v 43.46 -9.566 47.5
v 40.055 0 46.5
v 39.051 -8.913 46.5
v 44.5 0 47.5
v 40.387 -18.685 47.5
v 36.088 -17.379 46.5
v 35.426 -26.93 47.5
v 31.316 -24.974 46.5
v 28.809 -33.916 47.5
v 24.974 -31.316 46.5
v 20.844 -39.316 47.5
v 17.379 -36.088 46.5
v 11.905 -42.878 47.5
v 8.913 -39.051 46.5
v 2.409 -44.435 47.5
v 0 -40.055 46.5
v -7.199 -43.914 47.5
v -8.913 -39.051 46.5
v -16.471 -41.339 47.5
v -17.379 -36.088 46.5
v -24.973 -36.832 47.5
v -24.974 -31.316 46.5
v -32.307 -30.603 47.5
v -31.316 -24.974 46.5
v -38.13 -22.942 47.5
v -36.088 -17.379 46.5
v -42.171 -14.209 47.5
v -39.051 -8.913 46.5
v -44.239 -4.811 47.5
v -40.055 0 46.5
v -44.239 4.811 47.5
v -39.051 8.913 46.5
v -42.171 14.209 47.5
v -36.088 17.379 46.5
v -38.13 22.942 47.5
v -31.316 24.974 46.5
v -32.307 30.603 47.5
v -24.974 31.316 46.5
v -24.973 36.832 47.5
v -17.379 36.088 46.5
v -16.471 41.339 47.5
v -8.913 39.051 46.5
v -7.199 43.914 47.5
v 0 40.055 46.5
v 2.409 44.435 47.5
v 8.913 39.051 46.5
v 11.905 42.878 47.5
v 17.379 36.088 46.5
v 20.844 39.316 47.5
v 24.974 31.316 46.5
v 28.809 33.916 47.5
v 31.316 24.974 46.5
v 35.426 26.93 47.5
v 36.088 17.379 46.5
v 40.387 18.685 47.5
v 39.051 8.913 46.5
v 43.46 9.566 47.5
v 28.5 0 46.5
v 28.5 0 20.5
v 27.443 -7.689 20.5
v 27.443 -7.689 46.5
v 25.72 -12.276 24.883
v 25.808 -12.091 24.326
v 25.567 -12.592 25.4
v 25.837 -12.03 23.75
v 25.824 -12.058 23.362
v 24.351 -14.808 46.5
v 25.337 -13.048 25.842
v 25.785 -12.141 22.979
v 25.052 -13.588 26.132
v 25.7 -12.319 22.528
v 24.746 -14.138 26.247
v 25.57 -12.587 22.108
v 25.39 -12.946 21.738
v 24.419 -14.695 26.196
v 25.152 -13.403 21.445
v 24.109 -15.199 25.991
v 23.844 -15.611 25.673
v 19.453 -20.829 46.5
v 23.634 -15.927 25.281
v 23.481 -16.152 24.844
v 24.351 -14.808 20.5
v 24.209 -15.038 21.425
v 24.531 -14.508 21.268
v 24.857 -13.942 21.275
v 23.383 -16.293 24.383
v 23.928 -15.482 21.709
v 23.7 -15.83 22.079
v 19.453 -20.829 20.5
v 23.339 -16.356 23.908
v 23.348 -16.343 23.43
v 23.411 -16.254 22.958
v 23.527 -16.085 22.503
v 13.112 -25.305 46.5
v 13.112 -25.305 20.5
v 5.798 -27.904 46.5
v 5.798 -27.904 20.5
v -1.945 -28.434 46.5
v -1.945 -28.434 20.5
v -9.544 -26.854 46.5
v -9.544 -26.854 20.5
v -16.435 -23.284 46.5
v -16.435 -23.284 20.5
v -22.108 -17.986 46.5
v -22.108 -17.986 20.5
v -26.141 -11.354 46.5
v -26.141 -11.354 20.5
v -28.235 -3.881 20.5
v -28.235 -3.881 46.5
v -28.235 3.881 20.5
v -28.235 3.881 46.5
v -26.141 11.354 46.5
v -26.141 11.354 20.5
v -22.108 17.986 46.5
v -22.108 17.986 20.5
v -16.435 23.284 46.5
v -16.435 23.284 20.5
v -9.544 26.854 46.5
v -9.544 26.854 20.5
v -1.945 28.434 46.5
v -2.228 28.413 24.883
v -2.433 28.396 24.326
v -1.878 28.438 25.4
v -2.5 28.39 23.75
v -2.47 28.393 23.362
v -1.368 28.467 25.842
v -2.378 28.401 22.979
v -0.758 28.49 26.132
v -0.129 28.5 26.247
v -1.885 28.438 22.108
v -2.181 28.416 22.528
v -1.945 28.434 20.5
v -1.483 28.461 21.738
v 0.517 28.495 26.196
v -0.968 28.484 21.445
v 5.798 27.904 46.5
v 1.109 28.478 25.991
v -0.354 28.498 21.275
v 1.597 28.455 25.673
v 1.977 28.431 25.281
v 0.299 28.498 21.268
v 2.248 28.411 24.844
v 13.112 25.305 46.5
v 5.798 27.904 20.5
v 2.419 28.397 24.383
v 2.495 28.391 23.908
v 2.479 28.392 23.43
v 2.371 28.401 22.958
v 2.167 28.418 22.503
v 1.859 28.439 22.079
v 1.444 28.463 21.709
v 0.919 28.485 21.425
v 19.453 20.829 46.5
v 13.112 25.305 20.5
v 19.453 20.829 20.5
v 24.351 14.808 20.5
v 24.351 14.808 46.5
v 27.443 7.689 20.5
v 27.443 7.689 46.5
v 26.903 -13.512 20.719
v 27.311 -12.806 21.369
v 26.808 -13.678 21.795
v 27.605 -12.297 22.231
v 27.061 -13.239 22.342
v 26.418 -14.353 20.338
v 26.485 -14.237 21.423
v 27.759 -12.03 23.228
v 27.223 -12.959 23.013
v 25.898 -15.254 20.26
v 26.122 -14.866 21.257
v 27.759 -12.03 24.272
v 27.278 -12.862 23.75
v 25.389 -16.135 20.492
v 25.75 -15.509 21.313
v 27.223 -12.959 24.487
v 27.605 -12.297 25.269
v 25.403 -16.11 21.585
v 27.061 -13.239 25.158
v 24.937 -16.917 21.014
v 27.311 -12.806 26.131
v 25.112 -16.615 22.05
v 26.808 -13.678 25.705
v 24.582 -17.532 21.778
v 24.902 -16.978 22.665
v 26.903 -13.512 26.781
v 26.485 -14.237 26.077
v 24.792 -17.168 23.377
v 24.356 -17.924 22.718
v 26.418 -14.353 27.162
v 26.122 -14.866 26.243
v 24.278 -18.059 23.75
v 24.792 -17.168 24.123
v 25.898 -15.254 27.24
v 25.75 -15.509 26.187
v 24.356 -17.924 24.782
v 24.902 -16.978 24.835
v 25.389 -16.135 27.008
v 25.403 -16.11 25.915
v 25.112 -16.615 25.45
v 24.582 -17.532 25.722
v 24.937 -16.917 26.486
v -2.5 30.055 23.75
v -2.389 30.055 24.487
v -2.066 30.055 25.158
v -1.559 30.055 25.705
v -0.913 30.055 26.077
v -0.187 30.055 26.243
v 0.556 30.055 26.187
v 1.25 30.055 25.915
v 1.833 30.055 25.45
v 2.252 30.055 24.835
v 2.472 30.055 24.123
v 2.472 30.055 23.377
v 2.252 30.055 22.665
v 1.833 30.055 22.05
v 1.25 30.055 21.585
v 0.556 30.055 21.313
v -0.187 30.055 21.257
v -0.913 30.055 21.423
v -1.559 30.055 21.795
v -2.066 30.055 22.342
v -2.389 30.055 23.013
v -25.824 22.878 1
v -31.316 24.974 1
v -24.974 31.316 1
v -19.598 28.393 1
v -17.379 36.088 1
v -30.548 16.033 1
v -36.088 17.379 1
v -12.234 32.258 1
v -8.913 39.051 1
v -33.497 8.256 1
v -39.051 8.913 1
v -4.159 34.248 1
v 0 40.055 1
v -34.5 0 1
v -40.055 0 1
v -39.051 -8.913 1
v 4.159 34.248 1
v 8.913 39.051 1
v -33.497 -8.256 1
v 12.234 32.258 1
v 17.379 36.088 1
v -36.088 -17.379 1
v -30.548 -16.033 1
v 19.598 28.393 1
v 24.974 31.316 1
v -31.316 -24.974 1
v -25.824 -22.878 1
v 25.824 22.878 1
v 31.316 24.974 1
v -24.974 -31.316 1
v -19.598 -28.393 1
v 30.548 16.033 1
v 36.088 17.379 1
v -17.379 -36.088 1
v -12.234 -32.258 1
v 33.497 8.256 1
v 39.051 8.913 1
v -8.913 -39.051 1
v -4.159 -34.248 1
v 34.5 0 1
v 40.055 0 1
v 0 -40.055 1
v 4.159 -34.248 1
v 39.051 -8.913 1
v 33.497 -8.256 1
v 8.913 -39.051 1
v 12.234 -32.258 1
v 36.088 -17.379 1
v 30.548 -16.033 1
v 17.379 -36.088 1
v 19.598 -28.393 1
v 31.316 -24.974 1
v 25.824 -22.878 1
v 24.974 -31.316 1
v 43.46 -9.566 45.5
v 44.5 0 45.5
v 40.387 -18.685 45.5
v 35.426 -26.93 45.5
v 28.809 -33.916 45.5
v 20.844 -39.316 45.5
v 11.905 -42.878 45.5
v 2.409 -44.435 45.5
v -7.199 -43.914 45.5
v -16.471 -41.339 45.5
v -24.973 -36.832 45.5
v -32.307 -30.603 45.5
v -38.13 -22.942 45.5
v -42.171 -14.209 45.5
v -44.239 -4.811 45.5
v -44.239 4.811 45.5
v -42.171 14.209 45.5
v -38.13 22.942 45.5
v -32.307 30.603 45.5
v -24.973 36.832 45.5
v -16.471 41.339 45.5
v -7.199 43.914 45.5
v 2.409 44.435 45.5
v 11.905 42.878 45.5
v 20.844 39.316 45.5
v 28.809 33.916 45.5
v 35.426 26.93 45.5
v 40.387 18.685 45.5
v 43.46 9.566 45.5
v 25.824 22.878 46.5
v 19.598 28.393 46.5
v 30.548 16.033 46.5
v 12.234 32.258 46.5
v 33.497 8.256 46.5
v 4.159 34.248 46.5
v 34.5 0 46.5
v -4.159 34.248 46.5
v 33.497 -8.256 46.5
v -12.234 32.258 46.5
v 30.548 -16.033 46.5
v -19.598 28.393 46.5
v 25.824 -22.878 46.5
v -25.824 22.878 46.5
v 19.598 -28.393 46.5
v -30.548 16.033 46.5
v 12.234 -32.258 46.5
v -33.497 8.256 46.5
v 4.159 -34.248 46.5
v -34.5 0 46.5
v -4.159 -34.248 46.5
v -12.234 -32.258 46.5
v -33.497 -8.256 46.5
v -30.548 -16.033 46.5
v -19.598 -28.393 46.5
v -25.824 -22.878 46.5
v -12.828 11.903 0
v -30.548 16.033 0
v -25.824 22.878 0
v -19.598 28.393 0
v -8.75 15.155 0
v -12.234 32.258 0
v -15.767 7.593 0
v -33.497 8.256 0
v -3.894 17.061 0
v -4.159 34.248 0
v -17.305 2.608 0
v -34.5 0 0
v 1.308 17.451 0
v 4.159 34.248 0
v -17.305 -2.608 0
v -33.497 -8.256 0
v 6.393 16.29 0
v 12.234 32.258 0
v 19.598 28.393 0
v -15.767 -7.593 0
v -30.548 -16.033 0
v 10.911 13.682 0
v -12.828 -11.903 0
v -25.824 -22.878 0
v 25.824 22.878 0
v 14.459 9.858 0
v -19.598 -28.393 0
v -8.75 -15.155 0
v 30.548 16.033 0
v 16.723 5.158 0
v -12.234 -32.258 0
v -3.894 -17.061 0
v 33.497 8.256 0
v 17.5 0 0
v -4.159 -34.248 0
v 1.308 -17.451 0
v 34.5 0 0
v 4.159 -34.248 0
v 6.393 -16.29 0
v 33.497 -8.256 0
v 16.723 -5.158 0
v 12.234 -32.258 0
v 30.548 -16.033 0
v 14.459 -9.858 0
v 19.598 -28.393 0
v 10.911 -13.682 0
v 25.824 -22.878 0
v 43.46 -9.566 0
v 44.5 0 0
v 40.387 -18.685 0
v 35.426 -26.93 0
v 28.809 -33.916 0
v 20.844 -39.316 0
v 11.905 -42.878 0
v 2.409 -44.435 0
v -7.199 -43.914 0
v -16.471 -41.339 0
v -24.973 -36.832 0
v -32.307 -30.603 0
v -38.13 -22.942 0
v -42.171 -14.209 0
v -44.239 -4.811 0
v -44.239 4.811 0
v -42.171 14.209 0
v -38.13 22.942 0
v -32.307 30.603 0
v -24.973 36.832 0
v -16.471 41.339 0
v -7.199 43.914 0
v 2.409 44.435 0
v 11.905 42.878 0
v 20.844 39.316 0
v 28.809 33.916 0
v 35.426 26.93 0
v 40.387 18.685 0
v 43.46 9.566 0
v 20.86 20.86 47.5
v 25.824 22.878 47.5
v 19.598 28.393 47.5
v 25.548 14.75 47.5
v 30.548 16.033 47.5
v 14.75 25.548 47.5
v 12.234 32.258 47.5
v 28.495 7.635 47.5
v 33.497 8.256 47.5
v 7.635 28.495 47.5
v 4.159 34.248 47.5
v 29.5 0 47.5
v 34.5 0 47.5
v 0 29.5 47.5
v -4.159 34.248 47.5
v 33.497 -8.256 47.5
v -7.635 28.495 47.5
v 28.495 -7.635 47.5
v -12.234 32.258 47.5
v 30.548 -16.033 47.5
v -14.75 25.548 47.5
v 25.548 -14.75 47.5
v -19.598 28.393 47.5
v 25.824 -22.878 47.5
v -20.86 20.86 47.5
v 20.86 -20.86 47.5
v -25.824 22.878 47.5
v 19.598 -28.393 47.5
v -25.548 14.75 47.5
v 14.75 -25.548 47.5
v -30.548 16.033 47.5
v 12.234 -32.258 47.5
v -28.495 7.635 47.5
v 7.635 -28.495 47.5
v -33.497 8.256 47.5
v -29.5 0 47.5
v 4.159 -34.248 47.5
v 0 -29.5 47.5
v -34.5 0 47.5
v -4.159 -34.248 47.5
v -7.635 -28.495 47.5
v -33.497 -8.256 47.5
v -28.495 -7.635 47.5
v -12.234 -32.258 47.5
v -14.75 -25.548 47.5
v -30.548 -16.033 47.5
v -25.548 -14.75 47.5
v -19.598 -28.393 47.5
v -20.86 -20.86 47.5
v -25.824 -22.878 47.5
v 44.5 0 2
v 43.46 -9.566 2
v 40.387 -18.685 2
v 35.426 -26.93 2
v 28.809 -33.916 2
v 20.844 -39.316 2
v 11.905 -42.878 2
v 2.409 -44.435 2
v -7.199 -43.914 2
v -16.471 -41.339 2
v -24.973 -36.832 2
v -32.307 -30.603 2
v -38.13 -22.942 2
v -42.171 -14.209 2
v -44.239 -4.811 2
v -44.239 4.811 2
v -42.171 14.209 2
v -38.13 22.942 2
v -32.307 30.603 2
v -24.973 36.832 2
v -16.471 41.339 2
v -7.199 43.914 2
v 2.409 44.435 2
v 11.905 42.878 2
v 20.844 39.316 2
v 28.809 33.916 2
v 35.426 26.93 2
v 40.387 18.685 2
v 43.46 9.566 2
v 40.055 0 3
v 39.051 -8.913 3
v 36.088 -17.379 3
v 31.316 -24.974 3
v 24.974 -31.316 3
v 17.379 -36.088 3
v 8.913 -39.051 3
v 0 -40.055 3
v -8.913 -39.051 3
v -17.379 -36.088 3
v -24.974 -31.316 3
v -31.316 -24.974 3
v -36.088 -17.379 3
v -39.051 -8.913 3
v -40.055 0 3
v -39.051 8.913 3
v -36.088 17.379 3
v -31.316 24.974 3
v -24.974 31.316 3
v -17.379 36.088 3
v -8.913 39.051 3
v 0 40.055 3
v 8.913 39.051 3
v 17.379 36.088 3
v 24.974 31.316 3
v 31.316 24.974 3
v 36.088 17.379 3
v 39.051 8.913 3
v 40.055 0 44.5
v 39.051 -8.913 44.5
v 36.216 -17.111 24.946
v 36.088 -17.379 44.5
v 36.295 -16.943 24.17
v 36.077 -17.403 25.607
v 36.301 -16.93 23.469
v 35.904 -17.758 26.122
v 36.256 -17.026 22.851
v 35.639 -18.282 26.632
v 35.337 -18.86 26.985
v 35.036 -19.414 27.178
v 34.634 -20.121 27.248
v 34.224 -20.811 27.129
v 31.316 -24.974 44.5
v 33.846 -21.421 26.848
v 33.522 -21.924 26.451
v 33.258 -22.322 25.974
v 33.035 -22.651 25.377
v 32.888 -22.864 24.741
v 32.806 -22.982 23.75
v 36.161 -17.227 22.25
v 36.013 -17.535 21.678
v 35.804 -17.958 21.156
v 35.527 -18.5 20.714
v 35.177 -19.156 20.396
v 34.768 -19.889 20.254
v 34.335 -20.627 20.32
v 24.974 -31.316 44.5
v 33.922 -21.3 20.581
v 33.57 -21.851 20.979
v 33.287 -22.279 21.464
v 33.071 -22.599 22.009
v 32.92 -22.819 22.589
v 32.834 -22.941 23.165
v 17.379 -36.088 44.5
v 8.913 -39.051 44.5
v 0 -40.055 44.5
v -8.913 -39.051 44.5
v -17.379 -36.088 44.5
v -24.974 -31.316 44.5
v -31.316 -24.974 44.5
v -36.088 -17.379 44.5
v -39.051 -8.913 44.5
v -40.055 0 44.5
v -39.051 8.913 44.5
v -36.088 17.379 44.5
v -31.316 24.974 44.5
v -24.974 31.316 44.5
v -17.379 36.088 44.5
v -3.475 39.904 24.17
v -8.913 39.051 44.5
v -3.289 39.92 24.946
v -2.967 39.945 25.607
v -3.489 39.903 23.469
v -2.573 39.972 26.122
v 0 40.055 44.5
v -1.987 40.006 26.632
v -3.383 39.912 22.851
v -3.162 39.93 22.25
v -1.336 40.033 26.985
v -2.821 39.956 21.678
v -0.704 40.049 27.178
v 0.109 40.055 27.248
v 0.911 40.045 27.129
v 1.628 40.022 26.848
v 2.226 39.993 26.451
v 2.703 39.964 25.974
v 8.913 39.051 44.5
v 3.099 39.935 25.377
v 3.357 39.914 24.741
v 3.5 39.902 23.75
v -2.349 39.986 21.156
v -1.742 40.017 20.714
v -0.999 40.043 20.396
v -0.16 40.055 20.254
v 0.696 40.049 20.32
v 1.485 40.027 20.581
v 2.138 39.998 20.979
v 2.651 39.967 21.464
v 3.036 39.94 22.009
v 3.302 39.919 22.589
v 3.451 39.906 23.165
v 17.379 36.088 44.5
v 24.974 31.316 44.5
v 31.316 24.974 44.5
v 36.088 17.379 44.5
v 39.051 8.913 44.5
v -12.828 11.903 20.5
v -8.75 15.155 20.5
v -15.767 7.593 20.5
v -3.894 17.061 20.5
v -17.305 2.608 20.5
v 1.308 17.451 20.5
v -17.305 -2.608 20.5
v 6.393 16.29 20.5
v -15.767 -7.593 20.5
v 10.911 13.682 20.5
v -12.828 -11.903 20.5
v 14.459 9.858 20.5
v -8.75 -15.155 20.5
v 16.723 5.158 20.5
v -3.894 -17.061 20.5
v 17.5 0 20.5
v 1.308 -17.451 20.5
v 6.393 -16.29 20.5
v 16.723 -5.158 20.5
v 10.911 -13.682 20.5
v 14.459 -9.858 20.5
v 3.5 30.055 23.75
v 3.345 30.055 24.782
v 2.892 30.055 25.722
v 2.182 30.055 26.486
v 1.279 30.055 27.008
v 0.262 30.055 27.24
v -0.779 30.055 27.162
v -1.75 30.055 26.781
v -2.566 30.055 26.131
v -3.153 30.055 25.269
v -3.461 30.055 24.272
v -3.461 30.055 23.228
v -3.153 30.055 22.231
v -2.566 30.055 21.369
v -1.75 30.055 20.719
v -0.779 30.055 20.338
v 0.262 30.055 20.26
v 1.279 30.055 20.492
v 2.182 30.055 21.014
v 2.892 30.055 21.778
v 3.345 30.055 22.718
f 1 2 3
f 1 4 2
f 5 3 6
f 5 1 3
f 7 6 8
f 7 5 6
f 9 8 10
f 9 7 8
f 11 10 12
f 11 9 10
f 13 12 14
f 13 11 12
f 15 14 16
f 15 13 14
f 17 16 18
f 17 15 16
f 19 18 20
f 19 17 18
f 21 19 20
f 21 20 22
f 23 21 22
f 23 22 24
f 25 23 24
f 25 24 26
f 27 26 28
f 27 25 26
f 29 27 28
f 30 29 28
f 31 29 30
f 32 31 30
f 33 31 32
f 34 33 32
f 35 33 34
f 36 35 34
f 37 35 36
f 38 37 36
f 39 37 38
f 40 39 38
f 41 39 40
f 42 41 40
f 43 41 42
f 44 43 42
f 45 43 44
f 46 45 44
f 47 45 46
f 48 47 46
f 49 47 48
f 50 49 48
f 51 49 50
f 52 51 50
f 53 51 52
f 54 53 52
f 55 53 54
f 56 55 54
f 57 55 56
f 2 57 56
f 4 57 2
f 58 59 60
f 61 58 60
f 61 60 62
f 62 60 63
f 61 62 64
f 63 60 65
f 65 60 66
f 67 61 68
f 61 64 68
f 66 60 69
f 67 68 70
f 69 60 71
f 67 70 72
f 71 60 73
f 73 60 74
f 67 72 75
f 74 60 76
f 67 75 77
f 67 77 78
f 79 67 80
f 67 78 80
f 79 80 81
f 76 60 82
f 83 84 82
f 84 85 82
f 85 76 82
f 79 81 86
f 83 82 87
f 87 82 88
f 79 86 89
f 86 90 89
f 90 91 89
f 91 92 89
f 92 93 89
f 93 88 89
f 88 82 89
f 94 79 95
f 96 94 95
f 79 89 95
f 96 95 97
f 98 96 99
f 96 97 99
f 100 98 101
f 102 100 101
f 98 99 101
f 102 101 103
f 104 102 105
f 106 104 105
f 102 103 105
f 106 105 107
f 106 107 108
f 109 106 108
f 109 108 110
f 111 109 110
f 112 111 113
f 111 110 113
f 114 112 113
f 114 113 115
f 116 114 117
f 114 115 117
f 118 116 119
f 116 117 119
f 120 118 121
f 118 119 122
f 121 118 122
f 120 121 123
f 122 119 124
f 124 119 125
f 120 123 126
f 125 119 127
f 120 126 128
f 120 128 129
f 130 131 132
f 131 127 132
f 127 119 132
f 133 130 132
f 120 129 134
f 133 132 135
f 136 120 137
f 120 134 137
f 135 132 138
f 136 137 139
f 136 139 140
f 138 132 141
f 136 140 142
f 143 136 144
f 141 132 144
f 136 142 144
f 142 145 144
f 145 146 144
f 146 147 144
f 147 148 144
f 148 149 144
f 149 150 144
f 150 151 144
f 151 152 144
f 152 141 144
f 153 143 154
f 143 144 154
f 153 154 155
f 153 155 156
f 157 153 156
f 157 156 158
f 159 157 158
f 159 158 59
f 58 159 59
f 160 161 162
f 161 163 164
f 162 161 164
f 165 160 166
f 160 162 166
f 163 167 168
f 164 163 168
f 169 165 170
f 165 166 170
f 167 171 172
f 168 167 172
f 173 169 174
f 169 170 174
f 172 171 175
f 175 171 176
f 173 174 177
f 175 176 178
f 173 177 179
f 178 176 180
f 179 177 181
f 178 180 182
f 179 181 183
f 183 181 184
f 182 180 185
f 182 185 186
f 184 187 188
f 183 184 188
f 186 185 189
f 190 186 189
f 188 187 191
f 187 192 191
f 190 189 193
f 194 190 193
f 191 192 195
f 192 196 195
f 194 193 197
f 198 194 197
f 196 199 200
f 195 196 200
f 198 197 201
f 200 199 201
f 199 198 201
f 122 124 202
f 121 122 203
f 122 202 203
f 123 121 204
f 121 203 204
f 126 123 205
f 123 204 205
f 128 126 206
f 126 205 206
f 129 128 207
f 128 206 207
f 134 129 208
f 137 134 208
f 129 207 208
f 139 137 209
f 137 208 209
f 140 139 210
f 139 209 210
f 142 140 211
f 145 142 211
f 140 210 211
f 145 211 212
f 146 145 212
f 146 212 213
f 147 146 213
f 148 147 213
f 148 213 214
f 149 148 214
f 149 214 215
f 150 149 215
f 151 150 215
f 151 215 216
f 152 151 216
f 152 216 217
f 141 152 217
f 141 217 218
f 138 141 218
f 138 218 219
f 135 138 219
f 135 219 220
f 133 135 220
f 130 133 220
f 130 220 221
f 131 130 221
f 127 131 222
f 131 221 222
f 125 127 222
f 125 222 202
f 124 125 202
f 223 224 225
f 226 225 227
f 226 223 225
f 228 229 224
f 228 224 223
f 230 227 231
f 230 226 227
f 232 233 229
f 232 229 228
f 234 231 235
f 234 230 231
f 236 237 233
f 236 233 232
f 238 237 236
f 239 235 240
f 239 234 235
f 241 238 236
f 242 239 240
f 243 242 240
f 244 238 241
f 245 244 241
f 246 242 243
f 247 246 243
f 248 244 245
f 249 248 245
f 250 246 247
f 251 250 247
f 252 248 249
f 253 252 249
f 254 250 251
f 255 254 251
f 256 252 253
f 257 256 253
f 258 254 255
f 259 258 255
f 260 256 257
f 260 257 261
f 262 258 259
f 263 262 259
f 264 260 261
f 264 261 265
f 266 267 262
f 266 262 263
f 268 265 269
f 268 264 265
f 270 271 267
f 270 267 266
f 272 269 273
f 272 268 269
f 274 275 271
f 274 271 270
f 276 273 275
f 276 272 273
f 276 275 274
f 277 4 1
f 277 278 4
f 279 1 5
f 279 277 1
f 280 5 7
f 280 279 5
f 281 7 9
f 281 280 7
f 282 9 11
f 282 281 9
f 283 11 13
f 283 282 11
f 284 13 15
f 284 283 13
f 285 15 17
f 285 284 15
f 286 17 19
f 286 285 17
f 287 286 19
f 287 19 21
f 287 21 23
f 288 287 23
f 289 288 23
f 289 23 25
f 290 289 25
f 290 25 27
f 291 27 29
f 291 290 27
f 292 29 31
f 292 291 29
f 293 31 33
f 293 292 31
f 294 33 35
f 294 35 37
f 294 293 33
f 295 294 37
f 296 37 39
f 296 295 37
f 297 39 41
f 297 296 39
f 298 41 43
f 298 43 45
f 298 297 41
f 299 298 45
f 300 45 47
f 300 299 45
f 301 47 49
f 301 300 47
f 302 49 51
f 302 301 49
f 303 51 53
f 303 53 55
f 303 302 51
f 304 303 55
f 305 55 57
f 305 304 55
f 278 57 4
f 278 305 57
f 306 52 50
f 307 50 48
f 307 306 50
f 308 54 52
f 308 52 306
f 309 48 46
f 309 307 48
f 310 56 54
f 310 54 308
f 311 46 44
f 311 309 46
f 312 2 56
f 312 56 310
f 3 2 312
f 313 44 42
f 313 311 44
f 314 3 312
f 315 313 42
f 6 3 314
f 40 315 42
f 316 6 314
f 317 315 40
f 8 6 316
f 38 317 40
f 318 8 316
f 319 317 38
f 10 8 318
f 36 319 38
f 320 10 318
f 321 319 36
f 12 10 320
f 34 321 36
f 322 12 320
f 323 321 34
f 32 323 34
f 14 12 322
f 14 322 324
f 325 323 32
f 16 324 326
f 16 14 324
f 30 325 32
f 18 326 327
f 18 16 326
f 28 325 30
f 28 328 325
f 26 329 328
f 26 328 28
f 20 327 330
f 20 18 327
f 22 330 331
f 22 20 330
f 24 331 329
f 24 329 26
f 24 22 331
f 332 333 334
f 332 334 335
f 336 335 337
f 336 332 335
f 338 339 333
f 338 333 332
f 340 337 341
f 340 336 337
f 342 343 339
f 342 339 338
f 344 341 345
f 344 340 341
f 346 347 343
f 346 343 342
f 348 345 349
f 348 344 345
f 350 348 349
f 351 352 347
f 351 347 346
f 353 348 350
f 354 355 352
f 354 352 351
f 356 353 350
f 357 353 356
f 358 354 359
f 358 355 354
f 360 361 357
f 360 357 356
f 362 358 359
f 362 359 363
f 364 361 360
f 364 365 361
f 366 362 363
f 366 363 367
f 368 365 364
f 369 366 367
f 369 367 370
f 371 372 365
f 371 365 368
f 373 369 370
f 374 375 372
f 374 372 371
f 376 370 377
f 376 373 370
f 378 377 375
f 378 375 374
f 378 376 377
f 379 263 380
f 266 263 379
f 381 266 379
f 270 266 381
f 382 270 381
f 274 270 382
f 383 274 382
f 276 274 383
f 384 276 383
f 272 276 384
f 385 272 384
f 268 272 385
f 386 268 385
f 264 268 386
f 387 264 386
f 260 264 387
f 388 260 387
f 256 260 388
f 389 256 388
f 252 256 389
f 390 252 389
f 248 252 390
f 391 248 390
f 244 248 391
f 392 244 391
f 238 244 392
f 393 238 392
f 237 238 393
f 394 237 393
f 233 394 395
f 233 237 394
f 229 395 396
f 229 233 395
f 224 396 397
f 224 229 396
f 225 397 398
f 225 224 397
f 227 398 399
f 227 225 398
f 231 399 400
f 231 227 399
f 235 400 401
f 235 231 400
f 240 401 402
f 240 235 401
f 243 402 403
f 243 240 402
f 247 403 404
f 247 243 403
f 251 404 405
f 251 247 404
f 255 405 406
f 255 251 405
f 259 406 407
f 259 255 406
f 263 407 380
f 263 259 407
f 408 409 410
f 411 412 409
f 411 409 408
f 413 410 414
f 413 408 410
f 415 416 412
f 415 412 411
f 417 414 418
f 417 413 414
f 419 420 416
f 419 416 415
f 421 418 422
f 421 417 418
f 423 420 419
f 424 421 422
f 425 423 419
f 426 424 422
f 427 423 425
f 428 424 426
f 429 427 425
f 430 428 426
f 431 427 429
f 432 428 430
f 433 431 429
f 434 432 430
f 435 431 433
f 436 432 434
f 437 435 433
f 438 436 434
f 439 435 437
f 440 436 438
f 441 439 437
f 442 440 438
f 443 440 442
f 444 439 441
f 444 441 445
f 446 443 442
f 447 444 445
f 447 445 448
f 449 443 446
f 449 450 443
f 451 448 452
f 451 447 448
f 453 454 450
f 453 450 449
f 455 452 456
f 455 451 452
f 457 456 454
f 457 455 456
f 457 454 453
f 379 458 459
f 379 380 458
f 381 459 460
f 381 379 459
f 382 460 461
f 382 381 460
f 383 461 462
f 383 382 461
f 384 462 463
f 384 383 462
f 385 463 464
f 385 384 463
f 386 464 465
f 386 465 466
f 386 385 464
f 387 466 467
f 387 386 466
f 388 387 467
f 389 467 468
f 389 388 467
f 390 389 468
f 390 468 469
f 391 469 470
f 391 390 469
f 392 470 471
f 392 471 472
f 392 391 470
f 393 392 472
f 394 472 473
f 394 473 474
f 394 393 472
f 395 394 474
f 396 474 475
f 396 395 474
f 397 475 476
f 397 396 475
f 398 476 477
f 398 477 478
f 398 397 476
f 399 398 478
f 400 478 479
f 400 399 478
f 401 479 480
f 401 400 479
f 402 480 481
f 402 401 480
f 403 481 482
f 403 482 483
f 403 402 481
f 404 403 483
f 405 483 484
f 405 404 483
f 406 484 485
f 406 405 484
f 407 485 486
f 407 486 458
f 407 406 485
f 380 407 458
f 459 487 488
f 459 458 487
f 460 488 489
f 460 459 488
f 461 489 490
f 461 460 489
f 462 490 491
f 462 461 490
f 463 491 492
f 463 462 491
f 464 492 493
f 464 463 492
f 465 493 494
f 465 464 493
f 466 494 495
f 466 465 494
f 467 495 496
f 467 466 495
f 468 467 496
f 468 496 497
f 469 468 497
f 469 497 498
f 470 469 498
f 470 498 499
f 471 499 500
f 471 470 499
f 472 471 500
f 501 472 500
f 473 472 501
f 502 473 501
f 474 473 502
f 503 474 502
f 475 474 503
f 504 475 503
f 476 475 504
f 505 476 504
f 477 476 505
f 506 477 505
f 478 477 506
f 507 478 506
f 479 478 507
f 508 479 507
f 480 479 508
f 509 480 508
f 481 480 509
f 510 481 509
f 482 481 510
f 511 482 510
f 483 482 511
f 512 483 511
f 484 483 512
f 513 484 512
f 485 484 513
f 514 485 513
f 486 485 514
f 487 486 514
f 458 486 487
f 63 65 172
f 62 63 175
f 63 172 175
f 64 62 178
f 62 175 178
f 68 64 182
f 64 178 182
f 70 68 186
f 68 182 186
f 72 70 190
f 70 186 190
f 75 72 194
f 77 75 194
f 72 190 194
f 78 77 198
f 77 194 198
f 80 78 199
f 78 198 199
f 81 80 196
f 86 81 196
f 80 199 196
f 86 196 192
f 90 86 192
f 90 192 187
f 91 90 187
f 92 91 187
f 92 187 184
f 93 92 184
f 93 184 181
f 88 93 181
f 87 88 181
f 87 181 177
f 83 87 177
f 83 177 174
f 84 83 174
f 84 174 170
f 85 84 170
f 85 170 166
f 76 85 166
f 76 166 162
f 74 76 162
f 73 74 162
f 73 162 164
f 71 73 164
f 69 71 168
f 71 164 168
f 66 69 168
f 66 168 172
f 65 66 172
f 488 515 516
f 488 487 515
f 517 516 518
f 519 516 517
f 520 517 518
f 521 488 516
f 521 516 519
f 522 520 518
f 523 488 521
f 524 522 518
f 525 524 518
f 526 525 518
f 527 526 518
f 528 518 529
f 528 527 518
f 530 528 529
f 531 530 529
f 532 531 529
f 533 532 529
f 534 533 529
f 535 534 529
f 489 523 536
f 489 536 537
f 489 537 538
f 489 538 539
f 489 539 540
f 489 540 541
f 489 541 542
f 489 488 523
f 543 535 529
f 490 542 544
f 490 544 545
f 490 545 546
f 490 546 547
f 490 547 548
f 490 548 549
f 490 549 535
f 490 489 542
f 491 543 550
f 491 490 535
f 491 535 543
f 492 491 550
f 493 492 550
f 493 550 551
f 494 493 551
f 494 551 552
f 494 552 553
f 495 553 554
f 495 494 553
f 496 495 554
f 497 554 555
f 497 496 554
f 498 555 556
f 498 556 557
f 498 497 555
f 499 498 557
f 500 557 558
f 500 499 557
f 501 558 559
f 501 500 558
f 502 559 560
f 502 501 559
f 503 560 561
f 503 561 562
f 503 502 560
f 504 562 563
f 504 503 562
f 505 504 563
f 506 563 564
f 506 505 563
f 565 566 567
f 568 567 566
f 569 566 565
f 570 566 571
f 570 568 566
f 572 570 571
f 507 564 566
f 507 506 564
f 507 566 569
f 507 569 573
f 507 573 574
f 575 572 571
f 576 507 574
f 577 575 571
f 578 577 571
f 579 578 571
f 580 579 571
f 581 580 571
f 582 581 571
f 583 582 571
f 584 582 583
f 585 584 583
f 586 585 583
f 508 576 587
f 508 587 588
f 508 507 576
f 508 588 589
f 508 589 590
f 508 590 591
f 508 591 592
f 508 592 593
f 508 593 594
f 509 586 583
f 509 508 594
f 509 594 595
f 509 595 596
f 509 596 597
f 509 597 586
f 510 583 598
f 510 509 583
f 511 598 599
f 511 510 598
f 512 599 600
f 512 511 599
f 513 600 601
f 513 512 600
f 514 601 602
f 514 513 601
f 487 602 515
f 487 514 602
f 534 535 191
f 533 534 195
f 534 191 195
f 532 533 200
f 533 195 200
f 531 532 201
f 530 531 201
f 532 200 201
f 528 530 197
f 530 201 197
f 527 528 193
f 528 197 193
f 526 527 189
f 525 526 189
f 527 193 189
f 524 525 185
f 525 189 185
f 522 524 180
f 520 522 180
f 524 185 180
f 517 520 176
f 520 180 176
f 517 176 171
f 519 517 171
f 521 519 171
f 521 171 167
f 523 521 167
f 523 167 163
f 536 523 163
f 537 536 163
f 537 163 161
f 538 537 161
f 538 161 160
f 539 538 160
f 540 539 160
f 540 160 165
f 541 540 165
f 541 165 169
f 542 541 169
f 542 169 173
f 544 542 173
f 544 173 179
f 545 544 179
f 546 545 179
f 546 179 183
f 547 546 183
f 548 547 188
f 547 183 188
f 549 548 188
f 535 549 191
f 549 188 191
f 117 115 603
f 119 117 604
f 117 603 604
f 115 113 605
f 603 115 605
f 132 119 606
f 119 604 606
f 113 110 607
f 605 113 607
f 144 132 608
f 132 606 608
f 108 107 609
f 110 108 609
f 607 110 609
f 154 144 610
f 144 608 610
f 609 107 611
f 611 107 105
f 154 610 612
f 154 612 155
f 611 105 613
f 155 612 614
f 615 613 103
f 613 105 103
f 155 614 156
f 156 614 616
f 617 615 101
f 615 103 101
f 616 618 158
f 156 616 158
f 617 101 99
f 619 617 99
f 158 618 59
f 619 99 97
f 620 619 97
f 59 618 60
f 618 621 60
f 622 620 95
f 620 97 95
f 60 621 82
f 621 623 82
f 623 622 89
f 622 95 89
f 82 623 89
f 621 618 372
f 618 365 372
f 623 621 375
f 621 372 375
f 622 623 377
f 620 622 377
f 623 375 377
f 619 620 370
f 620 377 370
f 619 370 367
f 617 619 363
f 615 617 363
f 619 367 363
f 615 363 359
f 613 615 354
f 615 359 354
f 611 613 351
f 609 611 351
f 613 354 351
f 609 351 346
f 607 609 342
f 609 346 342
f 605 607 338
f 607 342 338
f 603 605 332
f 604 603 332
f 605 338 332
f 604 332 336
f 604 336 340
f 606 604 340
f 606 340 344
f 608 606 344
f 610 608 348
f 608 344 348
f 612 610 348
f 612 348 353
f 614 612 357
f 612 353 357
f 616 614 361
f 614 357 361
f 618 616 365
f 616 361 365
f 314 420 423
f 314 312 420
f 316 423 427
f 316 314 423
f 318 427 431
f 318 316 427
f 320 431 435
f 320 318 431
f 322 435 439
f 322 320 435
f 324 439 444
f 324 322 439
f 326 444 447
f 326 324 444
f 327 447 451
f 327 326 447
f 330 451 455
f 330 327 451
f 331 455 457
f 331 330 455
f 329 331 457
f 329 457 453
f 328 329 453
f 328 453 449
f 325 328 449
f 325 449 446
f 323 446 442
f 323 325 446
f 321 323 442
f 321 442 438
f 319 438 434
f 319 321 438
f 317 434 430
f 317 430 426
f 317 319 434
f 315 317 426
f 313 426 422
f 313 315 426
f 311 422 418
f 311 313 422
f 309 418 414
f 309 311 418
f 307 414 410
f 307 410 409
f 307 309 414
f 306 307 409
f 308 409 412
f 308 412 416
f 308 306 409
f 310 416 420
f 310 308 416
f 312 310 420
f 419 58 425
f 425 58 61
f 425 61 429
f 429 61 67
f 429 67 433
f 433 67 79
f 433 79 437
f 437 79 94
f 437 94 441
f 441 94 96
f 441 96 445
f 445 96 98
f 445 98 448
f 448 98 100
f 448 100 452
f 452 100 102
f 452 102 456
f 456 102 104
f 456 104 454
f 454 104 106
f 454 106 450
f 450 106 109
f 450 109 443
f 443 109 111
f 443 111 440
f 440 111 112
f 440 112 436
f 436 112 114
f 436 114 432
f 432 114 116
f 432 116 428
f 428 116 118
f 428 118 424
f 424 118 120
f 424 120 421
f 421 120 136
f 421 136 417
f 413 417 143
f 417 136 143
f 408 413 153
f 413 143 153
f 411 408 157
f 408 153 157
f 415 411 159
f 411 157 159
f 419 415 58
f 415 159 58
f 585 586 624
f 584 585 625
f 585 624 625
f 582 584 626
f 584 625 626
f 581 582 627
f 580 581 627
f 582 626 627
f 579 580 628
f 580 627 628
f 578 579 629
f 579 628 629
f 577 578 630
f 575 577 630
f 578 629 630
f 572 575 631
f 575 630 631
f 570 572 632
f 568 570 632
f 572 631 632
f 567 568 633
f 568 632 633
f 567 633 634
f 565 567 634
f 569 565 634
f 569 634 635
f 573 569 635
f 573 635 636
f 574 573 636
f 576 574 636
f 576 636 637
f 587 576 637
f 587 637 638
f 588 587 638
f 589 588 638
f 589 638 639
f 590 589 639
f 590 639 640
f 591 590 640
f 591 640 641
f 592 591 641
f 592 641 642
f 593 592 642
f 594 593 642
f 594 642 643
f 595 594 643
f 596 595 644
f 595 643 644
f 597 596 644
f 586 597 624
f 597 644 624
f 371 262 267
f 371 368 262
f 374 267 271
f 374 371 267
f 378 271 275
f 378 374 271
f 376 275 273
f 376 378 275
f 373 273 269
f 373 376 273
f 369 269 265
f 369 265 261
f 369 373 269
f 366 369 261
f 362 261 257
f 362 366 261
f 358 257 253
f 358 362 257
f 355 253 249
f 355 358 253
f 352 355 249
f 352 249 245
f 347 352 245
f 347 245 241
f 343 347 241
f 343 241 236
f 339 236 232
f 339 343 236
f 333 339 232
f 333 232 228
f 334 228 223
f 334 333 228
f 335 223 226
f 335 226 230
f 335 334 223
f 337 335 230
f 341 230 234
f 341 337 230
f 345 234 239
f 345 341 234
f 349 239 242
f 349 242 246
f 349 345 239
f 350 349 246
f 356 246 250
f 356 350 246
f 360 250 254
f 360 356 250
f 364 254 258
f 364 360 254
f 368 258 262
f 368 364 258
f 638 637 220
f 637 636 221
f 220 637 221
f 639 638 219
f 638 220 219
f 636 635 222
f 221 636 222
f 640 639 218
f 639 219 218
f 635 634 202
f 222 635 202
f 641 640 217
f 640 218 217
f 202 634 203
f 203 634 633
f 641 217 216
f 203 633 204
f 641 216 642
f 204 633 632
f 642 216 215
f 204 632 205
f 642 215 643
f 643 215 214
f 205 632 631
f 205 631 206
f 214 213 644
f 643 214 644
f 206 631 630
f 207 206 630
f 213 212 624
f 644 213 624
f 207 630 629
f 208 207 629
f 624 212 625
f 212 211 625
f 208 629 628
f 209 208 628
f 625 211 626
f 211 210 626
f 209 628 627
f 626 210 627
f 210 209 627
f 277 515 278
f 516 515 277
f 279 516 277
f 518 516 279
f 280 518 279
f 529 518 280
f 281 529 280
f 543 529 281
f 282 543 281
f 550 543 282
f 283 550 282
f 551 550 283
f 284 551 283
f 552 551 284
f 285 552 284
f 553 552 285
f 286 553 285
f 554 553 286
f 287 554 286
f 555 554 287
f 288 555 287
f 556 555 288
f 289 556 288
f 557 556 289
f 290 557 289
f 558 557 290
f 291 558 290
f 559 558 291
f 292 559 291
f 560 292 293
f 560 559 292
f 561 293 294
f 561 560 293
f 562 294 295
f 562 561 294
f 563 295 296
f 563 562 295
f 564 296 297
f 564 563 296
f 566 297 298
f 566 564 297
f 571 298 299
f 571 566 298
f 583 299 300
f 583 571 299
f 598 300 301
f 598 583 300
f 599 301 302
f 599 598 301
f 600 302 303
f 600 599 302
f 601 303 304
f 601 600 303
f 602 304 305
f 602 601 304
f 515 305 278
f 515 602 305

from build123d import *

# Parameters (mm, degrees)
F_7_0_7_DIAMETER_HOLE1_D     = 7
F_7_0_7_DIAMETER_HOLE1_DEPTH = 10
M6X1_0_TAPPED_HOLE1_REACH    = 100.969
M6X1_0_TAPPED_HOLE1_BORE_R   = 2.5
CIRPATTERN1_COUNT            = 2
CIRPATTERN1_ANGLE            = 120
CHAMFER1_SIZE                = 1


with BuildPart() as part:
    # Sketch1 → Revolve1 (revolve)
    with BuildSketch(Plane(origin=(0, 0, 0), x_dir=(0, 0, -1), z_dir=(1, 0, 0)), mode=Mode.PRIVATE) as revolve1_sk:
        Polygon((-47.5, 34.5), (-46.5, 34.5), (-46.5, 40.055), (-47.5, 44.5), (-45.5, 44.5), (-44.5, 40.055), (-3, 40.055), (-2, 44.5), (0, 44.5), (-1, 40.055), (-1, 34.5), (0, 34.5), (0, 0), (-47.5, 0), align=None)
    revolve(revolve1_sk.sketch.rotate(Axis((0, 0, 58.930723614), (0, 0, -1)), 90), axis=Axis((0, 0, 58.930723614), (0, 0, -1)))

    # Sketch2 → Cut-Revolve1 (revolve, cut)
    with BuildSketch(Plane(origin=(0, 0, 0), x_dir=(0, 0, -1), z_dir=(1, 0, 0)), mode=Mode.PRIVATE) as cut_revolve1_sk:
        Polygon((-20.5, 17.5), (0, 17.5), (0, 0), (-47.5, 0), (-47.5, 28.5), (-20.5, 28.5), align=None)
    revolve(cut_revolve1_sk.sketch.rotate(Axis((0, 0, 2.983613524), (0, 0, -1)), 90), axis=Axis((0, 0, 2.983613524), (0, 0, -1)), mode=Mode.SUBTRACT)

    # Ø7.0 (7) Diameter Hole1
    with Locations(Plane(origin=(0, 40.055, 0), x_dir=(-1, 0, 0), z_dir=(0, 1, 0))):
        with Locations((0, 23.75)):
            f_7_0_7_diameter_hole1 = Hole(F_7_0_7_DIAMETER_HOLE1_D / 2, depth=F_7_0_7_DIAMETER_HOLE1_DEPTH)

    # M6x1.0 Tapped Hole1 bore → M6x1.0 Tapped Hole1 (cut, up to next)
    with BuildSketch(Plane(origin=(0, 30.055, 0), x_dir=(-1, 0, 0), z_dir=(0, 1, 0)), mode=Mode.PRIVATE) as m6x1_0_tapped_hole1_sk1:
        with Locations((0, 23.75)):
            Circle(M6X1_0_TAPPED_HOLE1_BORE_R)
    m6x1_0_tapped_hole1_tool1 = extrude(m6x1_0_tapped_hole1_sk1.sketch, amount=-M6X1_0_TAPPED_HOLE1_REACH, mode=Mode.PRIVATE) & part.part
    m6x1_0_tapped_hole1 = m6x1_0_tapped_hole1_tool1.solids().sort_by_distance((0, 30.055, 23.75))[0]
    add(m6x1_0_tapped_hole1, mode=Mode.SUBTRACT)

    # CirPattern1: Ø7.0 (7) Diameter Hole1, M6x1.0 Tapped Hole1 ×2 about axis
    cirpattern1_axis = Axis((0, 0, 2.983613524), (0, 0, -1))
    add([f_7_0_7_diameter_hole1.rotate(cirpattern1_axis, i * CIRPATTERN1_ANGLE / (CIRPATTERN1_COUNT - 1)) for i in range(1, CIRPATTERN1_COUNT)], mode=Mode.SUBTRACT)
    add([m6x1_0_tapped_hole1.rotate(cirpattern1_axis, i * CIRPATTERN1_ANGLE / (CIRPATTERN1_COUNT - 1)) for i in range(1, CIRPATTERN1_COUNT)], mode=Mode.SUBTRACT)

    # Chamfer1
    chamfer1_edges = [part.edges().sort_by_distance(p)[0] for p in [
        (-28.5, 0, 47.5),
    ]]
    chamfer(chamfer1_edges, length=CHAMFER1_SIZE)


solid = part.part
